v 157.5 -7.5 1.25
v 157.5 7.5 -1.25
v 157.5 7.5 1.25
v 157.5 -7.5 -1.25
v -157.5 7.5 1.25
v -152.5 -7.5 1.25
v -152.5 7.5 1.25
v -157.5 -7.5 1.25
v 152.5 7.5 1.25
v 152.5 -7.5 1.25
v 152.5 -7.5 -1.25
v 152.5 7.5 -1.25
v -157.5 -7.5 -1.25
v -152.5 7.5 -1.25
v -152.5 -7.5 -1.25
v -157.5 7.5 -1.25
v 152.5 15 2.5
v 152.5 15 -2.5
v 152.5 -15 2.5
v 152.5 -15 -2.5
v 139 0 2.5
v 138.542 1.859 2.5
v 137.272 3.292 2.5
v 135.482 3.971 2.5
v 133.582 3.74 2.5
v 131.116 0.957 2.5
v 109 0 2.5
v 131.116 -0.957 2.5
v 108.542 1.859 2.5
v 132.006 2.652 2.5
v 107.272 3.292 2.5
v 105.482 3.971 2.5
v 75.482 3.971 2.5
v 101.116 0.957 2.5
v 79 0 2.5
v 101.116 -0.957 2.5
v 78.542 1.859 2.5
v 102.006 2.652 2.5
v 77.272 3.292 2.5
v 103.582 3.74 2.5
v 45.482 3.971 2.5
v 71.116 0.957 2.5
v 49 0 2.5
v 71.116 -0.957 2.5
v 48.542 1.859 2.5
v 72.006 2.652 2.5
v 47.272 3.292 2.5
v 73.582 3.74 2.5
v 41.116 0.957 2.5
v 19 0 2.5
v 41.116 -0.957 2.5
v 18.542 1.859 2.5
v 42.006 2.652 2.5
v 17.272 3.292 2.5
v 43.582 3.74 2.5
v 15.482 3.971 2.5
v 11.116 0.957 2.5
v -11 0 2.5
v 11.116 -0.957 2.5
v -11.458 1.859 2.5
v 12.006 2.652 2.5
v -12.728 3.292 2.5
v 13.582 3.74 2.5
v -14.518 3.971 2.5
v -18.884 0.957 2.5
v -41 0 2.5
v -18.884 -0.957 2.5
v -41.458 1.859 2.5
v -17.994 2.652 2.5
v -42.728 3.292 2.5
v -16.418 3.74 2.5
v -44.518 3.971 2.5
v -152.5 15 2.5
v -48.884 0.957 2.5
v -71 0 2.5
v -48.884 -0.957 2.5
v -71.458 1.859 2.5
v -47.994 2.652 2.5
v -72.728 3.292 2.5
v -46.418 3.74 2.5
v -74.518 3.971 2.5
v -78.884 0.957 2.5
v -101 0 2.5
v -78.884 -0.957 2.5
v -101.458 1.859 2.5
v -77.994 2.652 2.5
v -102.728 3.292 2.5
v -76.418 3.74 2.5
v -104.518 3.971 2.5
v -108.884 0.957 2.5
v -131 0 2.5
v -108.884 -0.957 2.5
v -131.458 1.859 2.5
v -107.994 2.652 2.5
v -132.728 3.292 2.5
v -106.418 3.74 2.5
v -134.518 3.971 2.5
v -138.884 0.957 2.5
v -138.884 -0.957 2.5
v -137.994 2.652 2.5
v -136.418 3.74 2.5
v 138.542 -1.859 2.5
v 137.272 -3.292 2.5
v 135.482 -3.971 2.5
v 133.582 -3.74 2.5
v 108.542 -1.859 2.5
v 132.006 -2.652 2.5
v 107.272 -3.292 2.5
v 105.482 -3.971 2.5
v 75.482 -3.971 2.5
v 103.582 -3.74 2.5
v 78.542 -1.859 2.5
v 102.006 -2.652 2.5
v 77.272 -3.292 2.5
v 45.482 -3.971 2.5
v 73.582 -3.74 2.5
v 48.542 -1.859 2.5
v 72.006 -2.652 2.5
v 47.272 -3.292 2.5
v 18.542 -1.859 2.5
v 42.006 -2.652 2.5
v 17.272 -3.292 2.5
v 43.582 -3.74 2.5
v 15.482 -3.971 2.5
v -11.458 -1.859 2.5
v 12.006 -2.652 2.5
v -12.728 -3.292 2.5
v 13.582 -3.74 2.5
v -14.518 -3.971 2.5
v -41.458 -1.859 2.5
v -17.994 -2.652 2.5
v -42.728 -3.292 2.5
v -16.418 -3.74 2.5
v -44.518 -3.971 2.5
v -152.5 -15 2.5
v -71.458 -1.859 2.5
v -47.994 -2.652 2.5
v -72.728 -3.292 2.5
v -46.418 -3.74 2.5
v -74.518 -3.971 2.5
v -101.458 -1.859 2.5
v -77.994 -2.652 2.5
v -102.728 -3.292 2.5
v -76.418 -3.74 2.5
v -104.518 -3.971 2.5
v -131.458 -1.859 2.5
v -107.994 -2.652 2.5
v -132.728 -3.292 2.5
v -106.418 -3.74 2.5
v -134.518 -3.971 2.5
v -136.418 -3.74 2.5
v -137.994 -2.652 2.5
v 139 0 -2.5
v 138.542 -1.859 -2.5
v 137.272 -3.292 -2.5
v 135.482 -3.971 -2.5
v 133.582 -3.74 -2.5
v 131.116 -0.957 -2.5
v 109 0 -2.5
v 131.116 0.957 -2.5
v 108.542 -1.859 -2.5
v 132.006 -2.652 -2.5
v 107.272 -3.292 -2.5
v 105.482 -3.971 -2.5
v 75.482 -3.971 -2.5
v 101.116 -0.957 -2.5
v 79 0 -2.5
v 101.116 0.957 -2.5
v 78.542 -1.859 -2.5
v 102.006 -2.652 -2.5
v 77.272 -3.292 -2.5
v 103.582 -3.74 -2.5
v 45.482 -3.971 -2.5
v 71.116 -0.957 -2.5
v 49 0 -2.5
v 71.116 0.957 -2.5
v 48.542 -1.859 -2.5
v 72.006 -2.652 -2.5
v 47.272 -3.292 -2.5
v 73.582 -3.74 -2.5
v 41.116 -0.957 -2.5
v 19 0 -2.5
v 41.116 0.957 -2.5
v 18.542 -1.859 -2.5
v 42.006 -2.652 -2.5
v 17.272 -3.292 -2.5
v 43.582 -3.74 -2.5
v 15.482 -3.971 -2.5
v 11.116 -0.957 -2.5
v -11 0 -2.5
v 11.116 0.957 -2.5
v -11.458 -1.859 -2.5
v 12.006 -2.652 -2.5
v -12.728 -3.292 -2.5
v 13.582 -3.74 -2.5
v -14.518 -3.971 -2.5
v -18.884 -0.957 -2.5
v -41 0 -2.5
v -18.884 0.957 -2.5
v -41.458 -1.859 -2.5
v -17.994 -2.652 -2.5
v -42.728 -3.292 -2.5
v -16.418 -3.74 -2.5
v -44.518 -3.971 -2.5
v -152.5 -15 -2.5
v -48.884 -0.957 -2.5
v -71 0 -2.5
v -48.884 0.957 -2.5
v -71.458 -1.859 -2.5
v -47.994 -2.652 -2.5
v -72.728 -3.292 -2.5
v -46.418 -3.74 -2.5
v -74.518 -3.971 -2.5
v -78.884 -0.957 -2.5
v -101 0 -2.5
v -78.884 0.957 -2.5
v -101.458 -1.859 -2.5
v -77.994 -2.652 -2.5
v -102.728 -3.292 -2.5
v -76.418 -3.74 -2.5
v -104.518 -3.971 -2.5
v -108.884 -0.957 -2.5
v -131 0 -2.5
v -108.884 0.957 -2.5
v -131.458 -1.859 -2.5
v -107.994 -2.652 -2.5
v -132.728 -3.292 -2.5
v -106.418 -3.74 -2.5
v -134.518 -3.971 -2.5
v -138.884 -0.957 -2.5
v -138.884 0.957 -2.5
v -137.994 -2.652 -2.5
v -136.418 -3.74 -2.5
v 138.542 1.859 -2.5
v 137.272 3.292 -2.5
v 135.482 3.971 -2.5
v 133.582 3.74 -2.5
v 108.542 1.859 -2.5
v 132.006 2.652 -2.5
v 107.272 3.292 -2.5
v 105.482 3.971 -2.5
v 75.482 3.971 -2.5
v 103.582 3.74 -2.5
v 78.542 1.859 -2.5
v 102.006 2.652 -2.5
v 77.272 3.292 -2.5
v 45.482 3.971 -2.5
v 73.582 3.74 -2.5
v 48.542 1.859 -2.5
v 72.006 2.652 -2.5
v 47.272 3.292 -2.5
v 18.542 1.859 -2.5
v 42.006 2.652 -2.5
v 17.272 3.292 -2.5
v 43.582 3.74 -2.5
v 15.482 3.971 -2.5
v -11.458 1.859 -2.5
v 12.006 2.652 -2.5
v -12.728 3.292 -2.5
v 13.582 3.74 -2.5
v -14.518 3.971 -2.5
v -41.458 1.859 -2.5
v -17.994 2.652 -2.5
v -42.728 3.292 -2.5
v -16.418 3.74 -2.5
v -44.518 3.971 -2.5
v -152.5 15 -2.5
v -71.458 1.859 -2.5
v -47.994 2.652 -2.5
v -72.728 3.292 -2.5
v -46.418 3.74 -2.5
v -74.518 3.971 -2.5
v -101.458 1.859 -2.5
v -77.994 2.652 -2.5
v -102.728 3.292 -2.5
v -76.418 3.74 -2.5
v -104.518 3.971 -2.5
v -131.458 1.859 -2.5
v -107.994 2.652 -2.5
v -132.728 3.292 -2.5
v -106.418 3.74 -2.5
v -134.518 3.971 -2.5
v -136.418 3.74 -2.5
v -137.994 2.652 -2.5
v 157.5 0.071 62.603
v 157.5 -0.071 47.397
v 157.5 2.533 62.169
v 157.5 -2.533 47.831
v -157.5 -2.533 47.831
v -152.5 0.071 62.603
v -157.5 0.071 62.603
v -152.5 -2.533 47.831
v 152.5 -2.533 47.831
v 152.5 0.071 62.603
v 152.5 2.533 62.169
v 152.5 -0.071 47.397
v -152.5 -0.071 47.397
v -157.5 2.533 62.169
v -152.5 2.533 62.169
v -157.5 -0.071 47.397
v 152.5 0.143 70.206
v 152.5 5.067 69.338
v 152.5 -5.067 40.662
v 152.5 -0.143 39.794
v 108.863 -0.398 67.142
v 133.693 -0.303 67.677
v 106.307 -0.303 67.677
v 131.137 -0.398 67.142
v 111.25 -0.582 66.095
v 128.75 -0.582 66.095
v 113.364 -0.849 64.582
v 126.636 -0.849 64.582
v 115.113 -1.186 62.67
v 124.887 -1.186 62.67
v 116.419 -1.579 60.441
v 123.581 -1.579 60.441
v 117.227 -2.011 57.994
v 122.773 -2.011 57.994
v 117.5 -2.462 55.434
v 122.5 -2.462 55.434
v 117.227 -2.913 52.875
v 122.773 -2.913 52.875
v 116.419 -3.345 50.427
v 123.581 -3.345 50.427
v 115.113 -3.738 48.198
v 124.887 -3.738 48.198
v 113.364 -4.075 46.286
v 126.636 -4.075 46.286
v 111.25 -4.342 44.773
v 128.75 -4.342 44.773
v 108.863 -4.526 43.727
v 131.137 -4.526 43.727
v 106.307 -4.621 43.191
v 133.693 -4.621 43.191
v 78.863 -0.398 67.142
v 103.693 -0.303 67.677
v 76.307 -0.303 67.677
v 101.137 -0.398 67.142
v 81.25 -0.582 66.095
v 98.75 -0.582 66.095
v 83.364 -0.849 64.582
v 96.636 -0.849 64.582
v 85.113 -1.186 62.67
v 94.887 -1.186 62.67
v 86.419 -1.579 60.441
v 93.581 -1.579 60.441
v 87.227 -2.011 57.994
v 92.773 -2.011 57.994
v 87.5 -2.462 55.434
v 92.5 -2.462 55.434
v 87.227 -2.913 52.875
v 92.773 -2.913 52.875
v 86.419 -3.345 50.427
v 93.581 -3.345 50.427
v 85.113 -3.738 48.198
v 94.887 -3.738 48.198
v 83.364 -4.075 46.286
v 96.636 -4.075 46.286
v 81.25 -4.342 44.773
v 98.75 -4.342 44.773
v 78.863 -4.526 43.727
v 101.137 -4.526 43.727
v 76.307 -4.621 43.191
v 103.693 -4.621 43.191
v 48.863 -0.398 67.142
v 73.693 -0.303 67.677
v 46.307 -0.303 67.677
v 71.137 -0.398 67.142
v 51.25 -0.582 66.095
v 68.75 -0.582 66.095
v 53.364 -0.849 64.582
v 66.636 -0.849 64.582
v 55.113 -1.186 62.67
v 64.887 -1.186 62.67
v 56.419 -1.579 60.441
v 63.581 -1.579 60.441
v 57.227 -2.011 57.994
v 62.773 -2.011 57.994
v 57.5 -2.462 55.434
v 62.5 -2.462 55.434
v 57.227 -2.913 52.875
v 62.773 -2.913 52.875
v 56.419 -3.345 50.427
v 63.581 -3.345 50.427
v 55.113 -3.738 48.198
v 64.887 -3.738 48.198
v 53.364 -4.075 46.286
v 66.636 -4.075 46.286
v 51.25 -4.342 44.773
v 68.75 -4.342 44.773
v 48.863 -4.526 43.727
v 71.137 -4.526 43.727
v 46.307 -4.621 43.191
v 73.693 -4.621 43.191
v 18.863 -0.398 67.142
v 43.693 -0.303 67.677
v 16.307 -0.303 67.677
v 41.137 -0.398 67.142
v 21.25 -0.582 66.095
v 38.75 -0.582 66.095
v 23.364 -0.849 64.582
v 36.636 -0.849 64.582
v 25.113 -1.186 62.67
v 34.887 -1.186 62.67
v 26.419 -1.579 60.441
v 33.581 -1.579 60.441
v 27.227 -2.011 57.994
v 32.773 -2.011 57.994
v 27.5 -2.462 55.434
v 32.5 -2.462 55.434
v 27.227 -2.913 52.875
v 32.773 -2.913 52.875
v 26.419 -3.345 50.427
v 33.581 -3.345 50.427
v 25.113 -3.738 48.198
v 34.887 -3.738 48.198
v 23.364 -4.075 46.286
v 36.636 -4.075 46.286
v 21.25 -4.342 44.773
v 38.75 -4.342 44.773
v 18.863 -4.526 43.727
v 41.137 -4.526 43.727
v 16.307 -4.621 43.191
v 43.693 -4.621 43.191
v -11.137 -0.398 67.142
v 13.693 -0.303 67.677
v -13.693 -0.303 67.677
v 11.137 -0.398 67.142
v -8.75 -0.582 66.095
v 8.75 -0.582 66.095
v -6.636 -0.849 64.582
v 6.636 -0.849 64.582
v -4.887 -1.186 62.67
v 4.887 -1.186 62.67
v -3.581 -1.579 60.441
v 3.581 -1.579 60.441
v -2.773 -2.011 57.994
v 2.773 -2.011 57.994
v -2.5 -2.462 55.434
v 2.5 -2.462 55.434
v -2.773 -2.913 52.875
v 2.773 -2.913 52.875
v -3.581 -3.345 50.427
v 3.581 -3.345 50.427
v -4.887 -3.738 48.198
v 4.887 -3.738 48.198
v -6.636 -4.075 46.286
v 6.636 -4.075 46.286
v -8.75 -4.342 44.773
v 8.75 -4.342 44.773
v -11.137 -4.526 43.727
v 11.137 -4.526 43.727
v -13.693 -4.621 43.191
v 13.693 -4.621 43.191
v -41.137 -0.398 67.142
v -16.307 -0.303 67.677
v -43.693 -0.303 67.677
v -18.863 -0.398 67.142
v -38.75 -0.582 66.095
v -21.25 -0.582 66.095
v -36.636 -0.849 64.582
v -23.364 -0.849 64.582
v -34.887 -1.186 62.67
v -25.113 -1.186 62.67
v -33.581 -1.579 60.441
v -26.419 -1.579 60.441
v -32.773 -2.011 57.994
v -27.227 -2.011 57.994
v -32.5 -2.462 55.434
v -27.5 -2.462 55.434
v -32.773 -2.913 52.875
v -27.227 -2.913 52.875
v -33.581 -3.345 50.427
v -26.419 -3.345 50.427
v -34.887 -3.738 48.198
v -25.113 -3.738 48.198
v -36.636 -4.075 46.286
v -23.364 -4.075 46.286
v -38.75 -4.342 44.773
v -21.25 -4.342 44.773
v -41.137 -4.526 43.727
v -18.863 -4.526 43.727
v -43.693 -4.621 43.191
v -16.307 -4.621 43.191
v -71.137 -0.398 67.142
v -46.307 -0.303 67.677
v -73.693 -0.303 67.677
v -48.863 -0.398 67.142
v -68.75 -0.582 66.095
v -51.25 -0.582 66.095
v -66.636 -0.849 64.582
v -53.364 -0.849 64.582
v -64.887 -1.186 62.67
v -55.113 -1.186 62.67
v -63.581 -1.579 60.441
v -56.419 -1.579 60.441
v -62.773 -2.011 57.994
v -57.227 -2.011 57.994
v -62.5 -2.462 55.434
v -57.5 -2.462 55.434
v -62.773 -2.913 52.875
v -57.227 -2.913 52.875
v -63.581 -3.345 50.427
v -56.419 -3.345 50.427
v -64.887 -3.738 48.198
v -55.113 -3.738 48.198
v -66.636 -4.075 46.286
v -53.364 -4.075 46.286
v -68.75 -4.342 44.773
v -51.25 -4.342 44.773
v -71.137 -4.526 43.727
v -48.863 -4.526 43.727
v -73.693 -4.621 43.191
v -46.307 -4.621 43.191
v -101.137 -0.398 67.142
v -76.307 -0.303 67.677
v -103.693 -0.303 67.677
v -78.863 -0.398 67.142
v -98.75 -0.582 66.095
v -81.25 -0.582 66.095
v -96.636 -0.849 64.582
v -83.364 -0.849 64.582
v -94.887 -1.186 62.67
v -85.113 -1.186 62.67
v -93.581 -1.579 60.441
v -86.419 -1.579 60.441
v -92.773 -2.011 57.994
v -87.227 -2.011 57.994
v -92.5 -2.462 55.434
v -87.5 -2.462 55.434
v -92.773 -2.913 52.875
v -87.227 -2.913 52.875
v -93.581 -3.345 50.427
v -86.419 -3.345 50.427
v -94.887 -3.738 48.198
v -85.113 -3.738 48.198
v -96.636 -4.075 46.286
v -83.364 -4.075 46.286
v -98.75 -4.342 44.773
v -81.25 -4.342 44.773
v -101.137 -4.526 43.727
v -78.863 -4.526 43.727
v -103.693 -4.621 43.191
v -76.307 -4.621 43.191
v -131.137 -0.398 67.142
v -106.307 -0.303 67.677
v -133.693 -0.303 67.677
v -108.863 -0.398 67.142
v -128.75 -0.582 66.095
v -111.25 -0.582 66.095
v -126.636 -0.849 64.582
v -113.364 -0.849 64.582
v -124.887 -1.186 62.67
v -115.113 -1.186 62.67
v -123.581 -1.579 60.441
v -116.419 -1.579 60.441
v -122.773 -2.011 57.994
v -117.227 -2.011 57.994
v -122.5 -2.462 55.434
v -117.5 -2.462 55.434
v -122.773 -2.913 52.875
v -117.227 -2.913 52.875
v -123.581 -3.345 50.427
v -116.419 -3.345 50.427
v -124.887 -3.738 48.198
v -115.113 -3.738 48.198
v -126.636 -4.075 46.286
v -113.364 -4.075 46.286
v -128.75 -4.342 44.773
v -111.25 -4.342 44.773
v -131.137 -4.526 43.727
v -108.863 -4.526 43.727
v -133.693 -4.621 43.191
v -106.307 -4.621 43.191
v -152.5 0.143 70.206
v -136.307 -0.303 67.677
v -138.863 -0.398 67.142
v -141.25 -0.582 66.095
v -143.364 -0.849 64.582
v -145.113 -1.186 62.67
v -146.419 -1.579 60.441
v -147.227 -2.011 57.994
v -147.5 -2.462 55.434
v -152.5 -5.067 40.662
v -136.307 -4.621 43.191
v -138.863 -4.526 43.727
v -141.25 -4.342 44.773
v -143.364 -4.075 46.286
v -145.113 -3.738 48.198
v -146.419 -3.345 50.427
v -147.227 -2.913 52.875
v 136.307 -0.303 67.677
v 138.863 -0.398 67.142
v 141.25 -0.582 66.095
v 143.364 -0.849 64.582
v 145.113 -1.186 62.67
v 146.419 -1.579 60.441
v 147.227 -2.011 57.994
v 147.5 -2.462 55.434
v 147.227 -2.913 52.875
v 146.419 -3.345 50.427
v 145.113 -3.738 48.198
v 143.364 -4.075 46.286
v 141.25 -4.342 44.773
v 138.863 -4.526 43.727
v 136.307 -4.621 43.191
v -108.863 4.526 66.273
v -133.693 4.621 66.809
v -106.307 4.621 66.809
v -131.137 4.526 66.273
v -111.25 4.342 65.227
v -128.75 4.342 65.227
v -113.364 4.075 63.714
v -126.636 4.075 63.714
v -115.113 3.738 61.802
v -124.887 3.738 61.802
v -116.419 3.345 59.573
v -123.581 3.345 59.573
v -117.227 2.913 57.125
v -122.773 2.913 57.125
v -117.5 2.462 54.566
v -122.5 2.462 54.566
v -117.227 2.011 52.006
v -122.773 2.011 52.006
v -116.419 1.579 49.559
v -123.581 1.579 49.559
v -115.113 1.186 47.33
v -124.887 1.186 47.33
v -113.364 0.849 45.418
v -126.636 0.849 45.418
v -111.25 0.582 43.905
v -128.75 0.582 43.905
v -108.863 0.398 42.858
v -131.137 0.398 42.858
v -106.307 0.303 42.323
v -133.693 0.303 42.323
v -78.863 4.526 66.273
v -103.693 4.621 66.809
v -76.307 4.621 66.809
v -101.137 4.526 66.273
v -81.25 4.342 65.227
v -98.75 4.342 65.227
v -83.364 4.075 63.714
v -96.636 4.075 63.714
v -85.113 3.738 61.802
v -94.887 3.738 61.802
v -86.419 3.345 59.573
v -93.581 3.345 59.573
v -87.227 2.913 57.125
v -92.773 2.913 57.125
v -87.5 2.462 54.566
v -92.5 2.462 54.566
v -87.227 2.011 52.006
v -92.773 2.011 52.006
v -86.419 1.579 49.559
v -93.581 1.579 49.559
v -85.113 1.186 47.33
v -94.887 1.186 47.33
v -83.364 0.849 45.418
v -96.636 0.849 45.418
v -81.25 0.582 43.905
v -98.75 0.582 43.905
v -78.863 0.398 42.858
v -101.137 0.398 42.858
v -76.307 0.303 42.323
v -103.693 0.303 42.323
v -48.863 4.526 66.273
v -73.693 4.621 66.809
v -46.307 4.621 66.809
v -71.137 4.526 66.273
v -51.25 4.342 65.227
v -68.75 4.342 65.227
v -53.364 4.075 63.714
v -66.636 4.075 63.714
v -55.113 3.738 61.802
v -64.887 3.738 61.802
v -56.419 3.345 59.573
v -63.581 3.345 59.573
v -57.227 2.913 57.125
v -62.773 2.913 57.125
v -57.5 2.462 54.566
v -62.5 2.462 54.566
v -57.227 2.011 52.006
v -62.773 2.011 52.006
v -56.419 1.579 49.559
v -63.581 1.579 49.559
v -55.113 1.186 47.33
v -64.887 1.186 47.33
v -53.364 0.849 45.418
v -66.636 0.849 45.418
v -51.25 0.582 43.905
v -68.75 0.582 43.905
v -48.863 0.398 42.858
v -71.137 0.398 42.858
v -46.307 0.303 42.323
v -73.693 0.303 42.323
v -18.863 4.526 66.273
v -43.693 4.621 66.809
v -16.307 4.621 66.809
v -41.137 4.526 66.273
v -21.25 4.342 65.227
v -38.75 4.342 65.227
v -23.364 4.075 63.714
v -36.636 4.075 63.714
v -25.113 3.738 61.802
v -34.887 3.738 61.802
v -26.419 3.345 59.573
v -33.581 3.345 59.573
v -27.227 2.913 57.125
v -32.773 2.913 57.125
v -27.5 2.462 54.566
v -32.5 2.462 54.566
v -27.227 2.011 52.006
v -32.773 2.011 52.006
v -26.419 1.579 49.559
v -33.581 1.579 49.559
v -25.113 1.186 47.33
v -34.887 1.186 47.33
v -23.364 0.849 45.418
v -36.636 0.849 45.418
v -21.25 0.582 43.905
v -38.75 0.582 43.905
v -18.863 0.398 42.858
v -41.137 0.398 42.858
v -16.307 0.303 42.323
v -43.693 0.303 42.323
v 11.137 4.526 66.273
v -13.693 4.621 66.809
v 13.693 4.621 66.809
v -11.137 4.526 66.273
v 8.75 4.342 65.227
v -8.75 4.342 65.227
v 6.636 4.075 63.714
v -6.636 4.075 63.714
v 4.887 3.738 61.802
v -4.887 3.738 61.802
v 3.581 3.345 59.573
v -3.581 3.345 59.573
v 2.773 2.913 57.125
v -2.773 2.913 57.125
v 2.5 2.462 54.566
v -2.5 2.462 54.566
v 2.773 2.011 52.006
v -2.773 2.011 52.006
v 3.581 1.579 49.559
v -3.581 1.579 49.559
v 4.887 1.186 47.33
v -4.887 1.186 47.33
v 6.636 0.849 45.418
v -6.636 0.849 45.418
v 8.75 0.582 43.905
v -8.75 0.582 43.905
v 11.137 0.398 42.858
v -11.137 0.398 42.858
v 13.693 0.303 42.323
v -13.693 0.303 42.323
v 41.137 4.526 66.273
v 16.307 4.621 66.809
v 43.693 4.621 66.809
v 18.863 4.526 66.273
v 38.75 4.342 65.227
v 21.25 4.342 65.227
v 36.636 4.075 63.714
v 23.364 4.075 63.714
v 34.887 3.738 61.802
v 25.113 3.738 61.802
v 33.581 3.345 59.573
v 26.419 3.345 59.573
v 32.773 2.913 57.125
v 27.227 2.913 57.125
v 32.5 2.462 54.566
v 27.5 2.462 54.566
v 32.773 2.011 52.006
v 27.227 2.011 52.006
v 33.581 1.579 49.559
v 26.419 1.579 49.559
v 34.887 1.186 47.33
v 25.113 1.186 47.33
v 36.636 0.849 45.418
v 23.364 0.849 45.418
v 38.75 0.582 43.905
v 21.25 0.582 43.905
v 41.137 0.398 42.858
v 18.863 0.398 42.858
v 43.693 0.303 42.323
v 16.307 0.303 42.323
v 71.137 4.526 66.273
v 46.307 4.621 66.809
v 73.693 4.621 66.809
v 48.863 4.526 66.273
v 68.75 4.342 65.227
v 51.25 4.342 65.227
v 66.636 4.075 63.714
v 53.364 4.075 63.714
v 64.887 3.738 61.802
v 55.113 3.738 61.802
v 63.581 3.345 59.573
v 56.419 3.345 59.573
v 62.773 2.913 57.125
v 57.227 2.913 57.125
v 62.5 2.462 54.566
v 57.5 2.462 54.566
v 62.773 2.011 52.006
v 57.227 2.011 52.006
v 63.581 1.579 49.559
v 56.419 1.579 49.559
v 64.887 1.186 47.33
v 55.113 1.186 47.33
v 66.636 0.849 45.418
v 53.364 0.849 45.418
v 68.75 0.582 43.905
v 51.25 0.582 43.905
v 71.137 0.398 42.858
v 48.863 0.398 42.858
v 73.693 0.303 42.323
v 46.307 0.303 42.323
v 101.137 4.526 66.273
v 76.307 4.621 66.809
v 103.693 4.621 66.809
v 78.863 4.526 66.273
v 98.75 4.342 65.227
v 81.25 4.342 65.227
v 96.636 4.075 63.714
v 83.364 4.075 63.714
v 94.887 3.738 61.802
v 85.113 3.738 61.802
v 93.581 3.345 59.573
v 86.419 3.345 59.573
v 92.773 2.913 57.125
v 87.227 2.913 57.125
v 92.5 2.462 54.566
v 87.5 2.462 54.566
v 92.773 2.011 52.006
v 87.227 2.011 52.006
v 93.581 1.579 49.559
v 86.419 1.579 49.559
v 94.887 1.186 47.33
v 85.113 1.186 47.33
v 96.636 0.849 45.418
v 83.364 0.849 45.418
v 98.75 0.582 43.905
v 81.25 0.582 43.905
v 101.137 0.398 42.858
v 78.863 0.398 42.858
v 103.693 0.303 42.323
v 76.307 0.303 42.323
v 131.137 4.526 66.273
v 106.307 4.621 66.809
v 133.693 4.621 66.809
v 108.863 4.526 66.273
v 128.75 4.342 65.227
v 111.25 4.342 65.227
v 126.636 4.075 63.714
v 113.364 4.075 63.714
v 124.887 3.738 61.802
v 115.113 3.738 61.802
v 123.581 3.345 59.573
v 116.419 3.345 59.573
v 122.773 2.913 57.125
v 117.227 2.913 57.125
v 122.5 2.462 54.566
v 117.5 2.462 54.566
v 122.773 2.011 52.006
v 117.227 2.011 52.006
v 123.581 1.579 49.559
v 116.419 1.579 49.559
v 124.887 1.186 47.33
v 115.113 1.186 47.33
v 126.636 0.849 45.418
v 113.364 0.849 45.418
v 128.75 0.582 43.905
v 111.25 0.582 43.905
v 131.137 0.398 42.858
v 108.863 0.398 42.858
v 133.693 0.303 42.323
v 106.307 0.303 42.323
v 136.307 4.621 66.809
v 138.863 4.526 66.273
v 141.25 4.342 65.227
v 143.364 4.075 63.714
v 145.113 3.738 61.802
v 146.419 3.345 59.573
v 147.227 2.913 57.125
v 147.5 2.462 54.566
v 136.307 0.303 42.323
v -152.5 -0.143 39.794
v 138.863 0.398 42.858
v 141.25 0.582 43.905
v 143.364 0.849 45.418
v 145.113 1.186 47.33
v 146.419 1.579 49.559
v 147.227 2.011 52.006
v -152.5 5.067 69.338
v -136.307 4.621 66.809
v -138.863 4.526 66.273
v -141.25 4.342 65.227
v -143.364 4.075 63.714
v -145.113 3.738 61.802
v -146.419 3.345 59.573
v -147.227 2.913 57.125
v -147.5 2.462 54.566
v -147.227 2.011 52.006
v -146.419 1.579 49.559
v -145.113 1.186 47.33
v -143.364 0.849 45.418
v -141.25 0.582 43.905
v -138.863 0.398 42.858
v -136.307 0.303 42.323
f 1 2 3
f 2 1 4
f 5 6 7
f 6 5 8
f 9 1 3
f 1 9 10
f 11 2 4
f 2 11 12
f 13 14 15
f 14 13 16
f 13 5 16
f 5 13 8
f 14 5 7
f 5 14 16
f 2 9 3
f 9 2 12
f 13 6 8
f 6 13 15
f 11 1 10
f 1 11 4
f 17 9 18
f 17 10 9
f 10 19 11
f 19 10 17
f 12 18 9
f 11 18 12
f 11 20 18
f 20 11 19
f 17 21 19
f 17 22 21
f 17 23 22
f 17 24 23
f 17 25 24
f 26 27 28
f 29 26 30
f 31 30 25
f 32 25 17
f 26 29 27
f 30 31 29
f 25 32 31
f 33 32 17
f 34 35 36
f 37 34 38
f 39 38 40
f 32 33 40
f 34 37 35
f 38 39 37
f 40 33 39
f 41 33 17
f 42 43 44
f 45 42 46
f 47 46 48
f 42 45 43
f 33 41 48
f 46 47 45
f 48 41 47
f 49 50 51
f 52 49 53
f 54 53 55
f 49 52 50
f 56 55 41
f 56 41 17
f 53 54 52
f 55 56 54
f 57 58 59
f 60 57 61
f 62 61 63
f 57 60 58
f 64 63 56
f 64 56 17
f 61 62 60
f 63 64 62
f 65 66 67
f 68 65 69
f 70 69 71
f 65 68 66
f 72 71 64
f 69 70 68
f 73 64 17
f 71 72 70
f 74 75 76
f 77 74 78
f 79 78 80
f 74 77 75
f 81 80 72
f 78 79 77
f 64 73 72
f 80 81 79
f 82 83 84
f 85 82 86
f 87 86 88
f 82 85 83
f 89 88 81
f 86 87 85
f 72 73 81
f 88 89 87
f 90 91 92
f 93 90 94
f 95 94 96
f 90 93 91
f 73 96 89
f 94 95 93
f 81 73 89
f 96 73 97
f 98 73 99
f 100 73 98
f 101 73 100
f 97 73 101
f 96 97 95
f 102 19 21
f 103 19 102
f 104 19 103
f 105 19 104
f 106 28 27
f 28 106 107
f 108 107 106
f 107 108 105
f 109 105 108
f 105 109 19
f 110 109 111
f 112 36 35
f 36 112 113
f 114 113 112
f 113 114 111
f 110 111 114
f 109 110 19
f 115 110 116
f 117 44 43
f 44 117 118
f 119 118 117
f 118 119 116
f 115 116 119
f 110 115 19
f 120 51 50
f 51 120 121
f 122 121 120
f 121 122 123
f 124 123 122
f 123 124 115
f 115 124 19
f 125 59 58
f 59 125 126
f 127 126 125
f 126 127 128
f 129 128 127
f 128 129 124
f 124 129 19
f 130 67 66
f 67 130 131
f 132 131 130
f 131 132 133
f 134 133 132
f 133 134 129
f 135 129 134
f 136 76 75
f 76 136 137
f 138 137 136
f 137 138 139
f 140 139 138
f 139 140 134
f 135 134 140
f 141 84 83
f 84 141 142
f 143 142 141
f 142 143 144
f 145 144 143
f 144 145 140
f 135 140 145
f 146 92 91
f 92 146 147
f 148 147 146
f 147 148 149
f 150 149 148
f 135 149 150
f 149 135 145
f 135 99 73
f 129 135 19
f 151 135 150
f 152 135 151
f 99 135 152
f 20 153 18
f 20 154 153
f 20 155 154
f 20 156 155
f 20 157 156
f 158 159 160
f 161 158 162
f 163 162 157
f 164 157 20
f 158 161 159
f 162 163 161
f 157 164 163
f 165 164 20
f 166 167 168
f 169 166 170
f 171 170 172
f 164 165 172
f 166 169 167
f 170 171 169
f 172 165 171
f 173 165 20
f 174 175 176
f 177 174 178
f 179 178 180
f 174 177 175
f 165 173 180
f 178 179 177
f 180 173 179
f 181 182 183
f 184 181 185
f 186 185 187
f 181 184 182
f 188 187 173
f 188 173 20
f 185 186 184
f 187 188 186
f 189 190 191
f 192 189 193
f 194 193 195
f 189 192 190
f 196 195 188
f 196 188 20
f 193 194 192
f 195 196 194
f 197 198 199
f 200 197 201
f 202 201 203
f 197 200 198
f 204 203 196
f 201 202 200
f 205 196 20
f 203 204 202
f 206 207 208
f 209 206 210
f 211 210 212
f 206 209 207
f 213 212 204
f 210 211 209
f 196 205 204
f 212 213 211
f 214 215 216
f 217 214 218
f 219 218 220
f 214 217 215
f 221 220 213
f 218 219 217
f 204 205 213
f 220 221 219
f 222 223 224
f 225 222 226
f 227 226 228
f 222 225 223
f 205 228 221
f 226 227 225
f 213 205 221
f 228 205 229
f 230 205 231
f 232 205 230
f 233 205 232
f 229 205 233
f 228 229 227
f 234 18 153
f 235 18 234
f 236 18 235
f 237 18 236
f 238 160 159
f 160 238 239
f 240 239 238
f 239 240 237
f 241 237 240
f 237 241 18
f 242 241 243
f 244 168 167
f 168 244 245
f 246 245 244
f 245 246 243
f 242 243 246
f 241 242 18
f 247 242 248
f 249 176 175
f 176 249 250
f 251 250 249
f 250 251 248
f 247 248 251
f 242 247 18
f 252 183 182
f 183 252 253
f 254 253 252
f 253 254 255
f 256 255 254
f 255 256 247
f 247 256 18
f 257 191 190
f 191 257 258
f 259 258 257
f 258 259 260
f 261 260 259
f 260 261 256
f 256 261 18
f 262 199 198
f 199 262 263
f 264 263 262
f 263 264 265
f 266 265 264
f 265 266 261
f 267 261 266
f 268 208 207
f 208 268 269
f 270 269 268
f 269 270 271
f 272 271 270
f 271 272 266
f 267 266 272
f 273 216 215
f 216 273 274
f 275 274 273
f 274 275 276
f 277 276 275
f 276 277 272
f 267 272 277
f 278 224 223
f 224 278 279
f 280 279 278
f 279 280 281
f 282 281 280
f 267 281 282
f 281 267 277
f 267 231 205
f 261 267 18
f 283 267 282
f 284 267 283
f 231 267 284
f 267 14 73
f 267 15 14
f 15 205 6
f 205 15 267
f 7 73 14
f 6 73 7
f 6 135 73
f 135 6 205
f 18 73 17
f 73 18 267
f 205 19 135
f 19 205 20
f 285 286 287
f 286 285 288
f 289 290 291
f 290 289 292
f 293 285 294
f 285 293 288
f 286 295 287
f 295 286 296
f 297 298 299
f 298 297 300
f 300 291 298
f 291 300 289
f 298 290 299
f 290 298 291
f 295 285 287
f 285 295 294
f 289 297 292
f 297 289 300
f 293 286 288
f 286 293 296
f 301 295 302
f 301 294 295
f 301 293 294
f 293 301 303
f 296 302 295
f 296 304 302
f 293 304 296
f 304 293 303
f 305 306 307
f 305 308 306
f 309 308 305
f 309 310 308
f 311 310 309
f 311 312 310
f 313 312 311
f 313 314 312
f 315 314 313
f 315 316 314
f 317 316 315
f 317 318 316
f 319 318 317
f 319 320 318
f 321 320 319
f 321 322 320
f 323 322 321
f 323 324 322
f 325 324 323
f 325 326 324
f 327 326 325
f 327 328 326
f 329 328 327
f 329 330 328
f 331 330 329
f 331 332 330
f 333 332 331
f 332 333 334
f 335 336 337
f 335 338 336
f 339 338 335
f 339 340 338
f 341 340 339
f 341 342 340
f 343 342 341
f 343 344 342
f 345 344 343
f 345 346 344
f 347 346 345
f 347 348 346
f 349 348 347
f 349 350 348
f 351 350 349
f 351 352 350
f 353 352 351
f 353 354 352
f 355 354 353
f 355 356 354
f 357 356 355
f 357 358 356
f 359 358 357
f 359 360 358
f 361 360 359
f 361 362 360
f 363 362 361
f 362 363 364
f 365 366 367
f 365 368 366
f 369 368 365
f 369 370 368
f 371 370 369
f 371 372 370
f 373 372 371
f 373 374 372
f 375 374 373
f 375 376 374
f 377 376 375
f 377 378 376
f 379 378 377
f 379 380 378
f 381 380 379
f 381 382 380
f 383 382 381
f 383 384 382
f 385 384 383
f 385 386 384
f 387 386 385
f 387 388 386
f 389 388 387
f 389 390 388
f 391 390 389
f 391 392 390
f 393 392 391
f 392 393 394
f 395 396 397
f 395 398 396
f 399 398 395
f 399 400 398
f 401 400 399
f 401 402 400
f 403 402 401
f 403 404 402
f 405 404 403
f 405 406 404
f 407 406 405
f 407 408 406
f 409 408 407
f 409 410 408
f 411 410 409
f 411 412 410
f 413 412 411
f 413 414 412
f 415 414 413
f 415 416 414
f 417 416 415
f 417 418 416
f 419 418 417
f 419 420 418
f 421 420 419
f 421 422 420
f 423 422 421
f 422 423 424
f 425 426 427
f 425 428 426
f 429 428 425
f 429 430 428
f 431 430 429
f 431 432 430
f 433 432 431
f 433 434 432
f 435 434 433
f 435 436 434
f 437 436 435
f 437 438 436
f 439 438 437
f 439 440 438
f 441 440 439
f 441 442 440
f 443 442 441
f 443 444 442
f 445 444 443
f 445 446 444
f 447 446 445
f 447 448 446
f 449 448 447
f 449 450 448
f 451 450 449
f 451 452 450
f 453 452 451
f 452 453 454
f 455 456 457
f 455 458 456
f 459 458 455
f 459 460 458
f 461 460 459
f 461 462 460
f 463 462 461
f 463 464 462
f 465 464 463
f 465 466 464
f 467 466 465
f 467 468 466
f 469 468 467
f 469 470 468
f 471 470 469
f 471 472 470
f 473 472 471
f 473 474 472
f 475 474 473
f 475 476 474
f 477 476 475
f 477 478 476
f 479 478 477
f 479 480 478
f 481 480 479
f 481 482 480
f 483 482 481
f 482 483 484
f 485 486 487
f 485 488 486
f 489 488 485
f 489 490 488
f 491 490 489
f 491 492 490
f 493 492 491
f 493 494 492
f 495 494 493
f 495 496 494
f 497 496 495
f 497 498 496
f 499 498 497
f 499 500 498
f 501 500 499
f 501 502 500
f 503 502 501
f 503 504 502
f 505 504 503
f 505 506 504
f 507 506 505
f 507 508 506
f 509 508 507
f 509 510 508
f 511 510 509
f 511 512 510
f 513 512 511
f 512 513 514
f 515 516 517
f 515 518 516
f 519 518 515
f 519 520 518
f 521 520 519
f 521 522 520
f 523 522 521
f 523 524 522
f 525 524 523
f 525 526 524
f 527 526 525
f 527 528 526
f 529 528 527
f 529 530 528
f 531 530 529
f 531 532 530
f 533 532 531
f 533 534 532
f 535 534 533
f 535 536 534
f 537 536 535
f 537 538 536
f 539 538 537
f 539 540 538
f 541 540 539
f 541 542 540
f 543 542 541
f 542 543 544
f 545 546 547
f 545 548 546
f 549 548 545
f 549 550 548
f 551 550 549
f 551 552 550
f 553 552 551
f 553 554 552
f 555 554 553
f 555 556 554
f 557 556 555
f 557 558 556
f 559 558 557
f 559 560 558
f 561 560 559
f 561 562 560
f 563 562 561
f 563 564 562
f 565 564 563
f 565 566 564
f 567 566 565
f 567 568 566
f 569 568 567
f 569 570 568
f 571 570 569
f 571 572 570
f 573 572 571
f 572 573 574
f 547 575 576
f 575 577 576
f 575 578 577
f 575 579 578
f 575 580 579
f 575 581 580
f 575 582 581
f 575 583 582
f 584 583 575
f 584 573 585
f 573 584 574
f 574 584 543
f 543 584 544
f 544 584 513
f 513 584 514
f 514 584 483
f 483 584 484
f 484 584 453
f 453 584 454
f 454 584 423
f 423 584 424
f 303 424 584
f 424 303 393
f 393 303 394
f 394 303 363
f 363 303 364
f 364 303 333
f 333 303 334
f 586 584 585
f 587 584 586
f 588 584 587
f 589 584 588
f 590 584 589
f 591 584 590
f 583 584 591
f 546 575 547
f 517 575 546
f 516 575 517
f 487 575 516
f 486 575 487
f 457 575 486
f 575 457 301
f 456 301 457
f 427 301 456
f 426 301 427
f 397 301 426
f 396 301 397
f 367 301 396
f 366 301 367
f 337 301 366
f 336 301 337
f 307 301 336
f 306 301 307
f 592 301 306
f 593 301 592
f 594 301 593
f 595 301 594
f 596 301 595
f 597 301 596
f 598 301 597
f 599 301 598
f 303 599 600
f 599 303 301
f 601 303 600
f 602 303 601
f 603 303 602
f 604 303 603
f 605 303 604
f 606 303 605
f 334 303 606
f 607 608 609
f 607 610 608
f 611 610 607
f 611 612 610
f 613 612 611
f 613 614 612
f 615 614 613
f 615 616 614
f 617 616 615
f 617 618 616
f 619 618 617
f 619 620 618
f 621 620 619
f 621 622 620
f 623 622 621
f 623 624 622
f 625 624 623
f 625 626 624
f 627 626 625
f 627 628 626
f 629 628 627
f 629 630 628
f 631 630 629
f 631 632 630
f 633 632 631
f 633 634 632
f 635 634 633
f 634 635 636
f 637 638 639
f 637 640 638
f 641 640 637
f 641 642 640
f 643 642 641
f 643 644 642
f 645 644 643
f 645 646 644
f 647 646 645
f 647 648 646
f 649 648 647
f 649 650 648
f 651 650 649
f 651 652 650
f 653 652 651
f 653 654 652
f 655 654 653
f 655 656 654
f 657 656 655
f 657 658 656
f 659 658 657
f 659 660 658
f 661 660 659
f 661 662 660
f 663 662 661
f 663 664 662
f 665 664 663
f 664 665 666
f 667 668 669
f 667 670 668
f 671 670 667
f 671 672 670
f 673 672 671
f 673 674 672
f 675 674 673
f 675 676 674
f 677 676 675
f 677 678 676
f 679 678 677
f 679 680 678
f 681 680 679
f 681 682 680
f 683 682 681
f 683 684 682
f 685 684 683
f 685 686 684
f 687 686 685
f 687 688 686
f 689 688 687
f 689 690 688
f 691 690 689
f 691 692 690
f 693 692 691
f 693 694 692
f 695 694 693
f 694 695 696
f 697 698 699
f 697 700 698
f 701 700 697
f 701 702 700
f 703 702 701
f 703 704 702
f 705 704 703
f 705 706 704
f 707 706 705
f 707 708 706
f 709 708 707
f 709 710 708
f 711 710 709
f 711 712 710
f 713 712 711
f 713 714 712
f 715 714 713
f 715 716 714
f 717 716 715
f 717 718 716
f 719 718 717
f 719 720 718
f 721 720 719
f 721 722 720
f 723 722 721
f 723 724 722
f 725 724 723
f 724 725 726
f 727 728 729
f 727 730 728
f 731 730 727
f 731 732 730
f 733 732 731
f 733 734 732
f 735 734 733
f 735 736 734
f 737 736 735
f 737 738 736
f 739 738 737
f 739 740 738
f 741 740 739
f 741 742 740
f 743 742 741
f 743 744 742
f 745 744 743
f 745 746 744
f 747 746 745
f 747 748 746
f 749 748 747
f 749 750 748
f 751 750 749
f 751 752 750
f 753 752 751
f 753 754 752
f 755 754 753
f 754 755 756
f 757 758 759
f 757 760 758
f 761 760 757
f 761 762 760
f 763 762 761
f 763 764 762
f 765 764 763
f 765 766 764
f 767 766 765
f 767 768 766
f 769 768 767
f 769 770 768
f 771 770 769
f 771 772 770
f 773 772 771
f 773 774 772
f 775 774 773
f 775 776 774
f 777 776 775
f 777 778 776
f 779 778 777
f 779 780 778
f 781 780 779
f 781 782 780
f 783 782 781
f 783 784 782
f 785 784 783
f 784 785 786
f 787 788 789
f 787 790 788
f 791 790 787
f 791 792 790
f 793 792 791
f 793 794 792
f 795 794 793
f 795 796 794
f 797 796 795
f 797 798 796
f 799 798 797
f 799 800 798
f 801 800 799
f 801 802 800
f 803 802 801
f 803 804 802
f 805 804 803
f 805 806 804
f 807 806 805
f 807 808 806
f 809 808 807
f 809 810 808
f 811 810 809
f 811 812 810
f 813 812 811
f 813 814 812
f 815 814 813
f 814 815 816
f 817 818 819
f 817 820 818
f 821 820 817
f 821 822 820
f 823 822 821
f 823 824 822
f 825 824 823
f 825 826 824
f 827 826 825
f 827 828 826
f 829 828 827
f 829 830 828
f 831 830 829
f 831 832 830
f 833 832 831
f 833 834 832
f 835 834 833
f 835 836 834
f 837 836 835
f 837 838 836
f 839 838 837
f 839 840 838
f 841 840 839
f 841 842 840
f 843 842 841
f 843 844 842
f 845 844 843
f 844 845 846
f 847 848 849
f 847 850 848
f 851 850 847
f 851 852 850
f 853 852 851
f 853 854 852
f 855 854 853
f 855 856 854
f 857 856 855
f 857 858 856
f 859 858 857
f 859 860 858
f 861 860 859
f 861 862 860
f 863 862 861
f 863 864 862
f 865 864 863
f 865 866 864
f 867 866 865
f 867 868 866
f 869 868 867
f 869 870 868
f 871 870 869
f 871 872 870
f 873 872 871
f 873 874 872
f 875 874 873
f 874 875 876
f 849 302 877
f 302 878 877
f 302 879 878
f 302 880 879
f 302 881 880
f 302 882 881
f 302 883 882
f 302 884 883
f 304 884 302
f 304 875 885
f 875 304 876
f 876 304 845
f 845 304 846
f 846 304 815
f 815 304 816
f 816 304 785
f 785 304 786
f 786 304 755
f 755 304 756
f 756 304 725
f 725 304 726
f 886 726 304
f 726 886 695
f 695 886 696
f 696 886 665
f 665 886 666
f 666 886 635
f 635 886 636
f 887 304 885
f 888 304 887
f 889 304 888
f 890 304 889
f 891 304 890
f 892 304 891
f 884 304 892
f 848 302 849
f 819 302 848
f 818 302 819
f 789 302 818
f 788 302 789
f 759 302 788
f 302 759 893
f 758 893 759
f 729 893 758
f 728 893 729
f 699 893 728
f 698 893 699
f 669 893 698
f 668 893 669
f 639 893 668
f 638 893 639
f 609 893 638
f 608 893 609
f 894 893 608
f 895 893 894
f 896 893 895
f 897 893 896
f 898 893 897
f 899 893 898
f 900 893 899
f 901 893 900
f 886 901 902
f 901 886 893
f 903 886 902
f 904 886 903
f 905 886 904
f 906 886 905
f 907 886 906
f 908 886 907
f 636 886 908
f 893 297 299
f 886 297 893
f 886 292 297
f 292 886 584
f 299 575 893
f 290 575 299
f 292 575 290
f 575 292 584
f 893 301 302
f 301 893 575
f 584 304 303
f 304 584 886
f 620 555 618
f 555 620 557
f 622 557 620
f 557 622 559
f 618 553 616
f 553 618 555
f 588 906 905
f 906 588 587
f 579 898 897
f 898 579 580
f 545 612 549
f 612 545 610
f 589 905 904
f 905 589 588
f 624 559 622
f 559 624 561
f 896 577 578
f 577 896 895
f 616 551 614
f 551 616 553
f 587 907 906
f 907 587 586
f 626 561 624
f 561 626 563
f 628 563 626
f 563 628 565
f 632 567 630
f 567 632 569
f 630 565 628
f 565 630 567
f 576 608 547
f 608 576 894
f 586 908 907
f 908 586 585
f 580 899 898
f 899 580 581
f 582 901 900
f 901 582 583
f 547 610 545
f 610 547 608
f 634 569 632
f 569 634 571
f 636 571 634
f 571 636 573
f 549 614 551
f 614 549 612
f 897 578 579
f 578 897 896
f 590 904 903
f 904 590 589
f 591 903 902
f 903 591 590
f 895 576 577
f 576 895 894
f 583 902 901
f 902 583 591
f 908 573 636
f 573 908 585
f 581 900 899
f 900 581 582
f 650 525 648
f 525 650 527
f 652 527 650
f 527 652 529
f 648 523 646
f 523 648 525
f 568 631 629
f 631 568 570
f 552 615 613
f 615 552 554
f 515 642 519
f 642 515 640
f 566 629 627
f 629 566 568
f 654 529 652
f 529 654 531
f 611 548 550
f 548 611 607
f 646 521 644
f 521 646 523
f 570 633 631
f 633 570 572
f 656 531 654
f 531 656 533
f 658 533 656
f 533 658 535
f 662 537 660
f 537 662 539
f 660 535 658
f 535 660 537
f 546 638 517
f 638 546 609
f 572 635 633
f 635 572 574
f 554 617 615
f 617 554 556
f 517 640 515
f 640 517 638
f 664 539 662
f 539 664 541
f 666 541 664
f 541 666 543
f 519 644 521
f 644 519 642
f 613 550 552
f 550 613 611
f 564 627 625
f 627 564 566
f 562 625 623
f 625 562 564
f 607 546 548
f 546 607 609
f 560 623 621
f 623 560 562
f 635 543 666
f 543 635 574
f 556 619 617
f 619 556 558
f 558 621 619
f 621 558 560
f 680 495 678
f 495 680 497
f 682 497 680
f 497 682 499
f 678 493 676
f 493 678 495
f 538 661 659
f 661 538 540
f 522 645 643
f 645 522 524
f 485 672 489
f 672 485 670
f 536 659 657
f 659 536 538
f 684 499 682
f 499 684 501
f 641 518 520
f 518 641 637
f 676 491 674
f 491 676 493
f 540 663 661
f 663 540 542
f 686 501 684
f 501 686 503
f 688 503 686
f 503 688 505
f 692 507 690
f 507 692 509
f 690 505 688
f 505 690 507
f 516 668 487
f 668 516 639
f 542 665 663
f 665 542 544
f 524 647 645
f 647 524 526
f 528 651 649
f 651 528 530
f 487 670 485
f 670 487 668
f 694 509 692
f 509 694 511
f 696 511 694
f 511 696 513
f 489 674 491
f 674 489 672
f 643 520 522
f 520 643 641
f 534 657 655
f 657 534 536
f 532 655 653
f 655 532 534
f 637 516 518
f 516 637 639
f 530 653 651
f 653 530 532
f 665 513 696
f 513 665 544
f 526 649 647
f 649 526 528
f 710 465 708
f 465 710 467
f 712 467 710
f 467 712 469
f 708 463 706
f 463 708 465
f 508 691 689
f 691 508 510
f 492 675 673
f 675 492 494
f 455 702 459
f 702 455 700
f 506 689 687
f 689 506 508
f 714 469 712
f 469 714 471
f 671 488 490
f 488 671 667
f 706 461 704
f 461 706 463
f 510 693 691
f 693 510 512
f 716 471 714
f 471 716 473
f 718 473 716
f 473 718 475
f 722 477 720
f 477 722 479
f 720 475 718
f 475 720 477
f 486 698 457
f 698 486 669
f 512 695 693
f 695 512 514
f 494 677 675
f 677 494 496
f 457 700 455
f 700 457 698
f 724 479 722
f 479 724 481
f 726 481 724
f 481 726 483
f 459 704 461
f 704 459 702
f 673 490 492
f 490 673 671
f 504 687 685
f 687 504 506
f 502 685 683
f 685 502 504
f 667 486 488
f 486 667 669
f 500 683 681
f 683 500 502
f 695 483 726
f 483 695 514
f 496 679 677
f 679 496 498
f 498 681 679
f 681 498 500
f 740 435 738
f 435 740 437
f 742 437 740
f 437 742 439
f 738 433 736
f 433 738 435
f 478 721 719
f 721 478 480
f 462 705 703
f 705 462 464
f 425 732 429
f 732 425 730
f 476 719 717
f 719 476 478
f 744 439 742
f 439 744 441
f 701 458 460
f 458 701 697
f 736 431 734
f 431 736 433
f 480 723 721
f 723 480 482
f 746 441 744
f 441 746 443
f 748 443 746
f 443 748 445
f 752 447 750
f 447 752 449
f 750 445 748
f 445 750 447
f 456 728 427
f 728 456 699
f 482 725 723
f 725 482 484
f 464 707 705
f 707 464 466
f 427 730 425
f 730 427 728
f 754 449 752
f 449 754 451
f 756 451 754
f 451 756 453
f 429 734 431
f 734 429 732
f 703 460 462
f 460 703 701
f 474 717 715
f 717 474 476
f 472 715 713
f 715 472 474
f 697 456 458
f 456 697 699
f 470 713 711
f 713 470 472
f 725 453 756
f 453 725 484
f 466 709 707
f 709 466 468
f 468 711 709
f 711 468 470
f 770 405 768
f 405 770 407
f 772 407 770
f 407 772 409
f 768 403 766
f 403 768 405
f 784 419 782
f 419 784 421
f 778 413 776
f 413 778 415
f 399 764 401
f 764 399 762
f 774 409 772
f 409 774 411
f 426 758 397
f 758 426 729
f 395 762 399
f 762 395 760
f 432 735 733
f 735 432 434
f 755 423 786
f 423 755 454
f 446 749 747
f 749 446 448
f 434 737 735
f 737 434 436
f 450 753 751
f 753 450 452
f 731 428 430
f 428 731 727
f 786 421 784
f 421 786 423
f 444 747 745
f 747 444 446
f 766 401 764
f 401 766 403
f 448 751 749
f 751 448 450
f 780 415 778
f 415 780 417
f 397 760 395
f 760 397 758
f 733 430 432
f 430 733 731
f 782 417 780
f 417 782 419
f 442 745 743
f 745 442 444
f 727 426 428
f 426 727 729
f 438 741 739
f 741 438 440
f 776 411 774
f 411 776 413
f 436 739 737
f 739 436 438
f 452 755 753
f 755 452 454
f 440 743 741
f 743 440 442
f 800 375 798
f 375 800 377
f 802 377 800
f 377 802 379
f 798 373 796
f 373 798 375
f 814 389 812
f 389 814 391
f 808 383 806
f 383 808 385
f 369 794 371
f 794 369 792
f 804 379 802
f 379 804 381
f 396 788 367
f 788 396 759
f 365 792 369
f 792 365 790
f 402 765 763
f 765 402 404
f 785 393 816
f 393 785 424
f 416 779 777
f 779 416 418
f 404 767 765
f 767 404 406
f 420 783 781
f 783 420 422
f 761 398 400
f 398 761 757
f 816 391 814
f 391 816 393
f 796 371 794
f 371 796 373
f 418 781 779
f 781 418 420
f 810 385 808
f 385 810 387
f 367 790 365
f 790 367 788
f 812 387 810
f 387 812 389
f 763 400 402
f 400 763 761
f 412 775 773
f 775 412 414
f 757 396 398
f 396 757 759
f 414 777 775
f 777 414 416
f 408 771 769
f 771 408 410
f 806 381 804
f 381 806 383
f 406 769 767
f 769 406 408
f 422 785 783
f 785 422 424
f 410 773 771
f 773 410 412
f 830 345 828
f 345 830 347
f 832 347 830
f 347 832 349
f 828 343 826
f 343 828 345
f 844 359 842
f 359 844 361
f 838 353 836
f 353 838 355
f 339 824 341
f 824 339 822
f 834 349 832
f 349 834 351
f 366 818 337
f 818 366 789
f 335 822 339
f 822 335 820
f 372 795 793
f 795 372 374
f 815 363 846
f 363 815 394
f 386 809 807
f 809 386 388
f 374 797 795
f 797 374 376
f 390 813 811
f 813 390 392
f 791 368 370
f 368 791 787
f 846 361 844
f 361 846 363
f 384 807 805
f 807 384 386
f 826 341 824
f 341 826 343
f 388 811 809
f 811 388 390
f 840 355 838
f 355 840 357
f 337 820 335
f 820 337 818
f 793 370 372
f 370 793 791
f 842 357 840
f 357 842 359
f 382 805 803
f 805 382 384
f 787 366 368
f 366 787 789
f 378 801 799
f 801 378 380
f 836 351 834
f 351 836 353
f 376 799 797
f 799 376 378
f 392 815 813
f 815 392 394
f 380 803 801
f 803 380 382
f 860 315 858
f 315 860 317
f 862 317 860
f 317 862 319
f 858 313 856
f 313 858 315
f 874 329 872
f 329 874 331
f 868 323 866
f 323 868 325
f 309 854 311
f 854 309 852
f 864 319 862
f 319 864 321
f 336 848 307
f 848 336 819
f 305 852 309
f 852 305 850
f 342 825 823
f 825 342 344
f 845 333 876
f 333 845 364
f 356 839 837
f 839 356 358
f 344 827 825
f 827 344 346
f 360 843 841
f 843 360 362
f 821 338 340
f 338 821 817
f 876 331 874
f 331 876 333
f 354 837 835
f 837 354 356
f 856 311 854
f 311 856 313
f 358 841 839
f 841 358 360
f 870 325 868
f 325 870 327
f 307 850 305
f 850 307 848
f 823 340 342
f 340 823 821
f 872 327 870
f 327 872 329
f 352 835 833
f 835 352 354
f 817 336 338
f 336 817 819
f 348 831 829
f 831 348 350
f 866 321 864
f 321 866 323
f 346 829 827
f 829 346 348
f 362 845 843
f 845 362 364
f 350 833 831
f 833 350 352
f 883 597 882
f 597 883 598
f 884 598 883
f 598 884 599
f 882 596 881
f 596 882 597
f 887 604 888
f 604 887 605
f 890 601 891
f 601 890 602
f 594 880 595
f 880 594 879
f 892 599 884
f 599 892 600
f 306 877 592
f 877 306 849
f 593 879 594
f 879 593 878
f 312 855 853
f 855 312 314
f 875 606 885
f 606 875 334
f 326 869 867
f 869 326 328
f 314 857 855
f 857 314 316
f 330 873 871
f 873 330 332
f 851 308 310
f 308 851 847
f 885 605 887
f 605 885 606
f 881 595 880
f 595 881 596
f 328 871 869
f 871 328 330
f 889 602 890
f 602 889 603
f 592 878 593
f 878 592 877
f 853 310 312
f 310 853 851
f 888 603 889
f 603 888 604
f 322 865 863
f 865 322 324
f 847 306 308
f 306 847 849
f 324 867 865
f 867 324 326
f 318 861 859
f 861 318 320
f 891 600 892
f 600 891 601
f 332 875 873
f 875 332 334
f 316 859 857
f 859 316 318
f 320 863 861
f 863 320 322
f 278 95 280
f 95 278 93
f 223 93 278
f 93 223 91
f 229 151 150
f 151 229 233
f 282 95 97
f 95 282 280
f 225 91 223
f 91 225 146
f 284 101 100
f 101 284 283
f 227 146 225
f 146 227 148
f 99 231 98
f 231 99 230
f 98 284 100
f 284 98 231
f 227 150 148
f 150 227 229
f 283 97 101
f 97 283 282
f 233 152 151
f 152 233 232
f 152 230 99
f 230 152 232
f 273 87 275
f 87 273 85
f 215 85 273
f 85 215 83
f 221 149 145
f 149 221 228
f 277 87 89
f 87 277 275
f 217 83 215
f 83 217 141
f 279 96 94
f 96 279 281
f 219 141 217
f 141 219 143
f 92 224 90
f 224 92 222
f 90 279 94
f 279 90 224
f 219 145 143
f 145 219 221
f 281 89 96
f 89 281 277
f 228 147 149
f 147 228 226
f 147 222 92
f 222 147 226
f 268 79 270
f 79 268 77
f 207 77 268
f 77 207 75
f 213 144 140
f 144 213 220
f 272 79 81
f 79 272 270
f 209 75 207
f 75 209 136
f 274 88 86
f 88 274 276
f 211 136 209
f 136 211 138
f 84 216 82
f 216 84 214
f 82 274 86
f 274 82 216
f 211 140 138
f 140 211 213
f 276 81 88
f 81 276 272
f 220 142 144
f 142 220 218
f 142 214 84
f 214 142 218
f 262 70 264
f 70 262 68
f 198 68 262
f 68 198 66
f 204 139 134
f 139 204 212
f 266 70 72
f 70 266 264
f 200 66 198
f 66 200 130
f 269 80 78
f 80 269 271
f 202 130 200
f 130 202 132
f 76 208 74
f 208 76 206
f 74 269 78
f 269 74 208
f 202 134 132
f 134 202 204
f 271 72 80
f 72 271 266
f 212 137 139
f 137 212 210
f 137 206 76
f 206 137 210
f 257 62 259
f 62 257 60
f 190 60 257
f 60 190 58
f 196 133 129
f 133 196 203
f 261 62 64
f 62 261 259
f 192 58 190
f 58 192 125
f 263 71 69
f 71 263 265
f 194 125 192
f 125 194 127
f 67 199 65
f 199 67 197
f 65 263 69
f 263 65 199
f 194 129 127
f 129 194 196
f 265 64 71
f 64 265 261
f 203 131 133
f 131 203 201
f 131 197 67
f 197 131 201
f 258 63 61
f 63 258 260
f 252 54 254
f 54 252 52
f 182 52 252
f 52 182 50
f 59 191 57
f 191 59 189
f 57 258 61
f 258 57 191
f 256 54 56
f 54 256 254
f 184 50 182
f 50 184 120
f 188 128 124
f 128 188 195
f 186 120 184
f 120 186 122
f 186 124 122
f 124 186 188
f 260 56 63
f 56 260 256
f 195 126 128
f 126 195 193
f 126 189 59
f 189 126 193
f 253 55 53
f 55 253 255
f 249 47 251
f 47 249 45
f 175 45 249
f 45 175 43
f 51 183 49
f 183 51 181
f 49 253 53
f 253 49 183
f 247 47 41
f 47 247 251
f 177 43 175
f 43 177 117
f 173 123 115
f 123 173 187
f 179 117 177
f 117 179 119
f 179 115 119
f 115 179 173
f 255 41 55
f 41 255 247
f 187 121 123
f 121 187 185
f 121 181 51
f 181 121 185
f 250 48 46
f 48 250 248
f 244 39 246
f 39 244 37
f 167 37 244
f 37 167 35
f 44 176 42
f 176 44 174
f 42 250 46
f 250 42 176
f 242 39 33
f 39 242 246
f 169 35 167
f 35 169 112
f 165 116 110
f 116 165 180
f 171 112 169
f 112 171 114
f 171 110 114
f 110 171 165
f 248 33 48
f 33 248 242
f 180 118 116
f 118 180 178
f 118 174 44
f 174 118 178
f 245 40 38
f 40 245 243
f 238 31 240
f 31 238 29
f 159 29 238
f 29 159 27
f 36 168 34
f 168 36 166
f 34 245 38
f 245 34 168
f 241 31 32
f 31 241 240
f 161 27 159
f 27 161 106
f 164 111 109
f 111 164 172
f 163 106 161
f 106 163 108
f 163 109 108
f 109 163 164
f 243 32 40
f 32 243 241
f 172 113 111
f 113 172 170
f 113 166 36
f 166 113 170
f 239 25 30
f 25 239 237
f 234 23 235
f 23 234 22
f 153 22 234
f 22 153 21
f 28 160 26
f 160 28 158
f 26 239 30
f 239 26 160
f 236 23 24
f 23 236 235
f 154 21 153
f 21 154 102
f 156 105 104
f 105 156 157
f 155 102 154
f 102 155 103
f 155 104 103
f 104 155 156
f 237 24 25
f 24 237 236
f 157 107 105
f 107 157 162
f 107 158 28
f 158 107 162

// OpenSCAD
// file: modular_rails.scad
/* [top_rail] */
// Number of holes in the rail
hole_num = 10;
// Hole the paint bottle slips into in mm
body_hole_diameter = 25;
// The space between each hole in mm
body_hole_gap = 5;

/* [bottom_rail] */
nozzle_hole_diameter = 8;

/* [rail] */
// The thickness of the rail in mm
rail_height = 5;
// The width of the locking tabs
tab_width = 5;
// The angle of the rails in degrees
rail_angle = 80;

/* [frame] */
// Number of rails the frame is 
rail_pairs = 8;
rail_spacing = 25;

// calculates the width of the rail
function compute_rail_width (hole_num=hole_num, 
                            body_hole_diameter=body_hole_diameter, 
                            body_hole_gap=body_hole_gap) =
   (hole_num * body_hole_diameter) + ((hole_num - 1) * body_hole_gap) + (2 * body_hole_gap);

// Calculates the height of the frame 
function compute_frame_height (rail_pairs=rail_pairs ) = 0;

/* [Computed_Values] */
// Length (x-axis) of the rail in mm; Space consumed by the holes + The space between the holes + beginning and end gap
rail_width = compute_rail_width();
// Depth (y-axis) of the rail in mm; Pot diameter + 2.5mm on each side
rail_depth = body_hole_diameter + 5;
// the height (z-axis) of the tab; 1/2 of the rail height
tab_height = rail_height / 2;
// The gap between bottle nozzles on the bottom rail
nozzle_hole_gap = (body_hole_diameter / 2) + body_hole_gap;


// Builds the basic rail shape
module rail(rail_width=rail_width, rail_depth=rail_depth, 
            rail_height=rail_height, tab_width=tab_width) {
    union () {
        // add the locking tabs
        cube([rail_width + (tab_width * 2), rail_depth / 2, rail_height / 2], center=true);
        // add the rail
        cube([rail_width, rail_depth, rail_height], center=true);
    }
}


module top_rail(rail_width=rail_width, rail_height=rail_height, 
                body_hole_gap=body_hole_gap, 
                body_hole_diameter=body_hole_diameter) {

    difference () {
        rail();
        // Punch out the holes
        for( x=[((rail_width / 2) * -1) + body_hole_gap + (body_hole_diameter / 2) : (body_hole_gap + body_hole_diameter) : (rail_width / 2) - body_hole_gap - (body_hole_diameter / 2)] ) {
            translate([x, 0, 0])
                cylinder(r=(body_hole_diameter / 2), h=rail_height + 1, center=true);
        }
    }
}

module bottom_rail(rail_width=rail_width, rail_height=rail_height, 
                   body_hole_gap=body_hole_gap, 
                   body_hole_diameter=body_hole_diameter, 
                   nozzle_hole_diameter=nozzle_hole_diameter) {

    difference () {
        rail();
        // punch out the holes
        for( x=[((rail_width / 2) * -1) + body_hole_gap + (body_hole_diameter / 2) : (body_hole_gap + body_hole_diameter) : (rail_width / 2) - body_hole_gap - (body_hole_diameter / 2)] ) {
            translate([x, 0, 0])
                cylinder(r=(nozzle_hole_diameter / 2), h=rail_height + 1, center=true);
        }
    }

}

module frame(rail_depth=rail_depth, rail_height=rail_height, 
             rail_pairs=rail_pairs, tab_width=tab_width, tab_height=tab_height) {
    cube([tab_width, rail_depth, 100], center=true);

}

translate([0, 0, rail_spacing]) top_rail();
bottom_rail();
translate([(rail_width / 2) * -1, 0, 0]) frame();
// main file
use <modular_rails.scad>;

/* [frame] */
// Number rail pairs
rail_pairs = 8;
// Space between rails
rail_space = 25;
// The depth (y-axis) of the rails
rail_y = 30;
// The height (z-axis) of the rails
rail_z = 5;
// The width of the locking tabs on the rails
tab_x = 5;


module frame () {


}

 translate([0, 0, 55]) rotate([80, 0, 0]) top_rail();
bottom_rail();
frame();
